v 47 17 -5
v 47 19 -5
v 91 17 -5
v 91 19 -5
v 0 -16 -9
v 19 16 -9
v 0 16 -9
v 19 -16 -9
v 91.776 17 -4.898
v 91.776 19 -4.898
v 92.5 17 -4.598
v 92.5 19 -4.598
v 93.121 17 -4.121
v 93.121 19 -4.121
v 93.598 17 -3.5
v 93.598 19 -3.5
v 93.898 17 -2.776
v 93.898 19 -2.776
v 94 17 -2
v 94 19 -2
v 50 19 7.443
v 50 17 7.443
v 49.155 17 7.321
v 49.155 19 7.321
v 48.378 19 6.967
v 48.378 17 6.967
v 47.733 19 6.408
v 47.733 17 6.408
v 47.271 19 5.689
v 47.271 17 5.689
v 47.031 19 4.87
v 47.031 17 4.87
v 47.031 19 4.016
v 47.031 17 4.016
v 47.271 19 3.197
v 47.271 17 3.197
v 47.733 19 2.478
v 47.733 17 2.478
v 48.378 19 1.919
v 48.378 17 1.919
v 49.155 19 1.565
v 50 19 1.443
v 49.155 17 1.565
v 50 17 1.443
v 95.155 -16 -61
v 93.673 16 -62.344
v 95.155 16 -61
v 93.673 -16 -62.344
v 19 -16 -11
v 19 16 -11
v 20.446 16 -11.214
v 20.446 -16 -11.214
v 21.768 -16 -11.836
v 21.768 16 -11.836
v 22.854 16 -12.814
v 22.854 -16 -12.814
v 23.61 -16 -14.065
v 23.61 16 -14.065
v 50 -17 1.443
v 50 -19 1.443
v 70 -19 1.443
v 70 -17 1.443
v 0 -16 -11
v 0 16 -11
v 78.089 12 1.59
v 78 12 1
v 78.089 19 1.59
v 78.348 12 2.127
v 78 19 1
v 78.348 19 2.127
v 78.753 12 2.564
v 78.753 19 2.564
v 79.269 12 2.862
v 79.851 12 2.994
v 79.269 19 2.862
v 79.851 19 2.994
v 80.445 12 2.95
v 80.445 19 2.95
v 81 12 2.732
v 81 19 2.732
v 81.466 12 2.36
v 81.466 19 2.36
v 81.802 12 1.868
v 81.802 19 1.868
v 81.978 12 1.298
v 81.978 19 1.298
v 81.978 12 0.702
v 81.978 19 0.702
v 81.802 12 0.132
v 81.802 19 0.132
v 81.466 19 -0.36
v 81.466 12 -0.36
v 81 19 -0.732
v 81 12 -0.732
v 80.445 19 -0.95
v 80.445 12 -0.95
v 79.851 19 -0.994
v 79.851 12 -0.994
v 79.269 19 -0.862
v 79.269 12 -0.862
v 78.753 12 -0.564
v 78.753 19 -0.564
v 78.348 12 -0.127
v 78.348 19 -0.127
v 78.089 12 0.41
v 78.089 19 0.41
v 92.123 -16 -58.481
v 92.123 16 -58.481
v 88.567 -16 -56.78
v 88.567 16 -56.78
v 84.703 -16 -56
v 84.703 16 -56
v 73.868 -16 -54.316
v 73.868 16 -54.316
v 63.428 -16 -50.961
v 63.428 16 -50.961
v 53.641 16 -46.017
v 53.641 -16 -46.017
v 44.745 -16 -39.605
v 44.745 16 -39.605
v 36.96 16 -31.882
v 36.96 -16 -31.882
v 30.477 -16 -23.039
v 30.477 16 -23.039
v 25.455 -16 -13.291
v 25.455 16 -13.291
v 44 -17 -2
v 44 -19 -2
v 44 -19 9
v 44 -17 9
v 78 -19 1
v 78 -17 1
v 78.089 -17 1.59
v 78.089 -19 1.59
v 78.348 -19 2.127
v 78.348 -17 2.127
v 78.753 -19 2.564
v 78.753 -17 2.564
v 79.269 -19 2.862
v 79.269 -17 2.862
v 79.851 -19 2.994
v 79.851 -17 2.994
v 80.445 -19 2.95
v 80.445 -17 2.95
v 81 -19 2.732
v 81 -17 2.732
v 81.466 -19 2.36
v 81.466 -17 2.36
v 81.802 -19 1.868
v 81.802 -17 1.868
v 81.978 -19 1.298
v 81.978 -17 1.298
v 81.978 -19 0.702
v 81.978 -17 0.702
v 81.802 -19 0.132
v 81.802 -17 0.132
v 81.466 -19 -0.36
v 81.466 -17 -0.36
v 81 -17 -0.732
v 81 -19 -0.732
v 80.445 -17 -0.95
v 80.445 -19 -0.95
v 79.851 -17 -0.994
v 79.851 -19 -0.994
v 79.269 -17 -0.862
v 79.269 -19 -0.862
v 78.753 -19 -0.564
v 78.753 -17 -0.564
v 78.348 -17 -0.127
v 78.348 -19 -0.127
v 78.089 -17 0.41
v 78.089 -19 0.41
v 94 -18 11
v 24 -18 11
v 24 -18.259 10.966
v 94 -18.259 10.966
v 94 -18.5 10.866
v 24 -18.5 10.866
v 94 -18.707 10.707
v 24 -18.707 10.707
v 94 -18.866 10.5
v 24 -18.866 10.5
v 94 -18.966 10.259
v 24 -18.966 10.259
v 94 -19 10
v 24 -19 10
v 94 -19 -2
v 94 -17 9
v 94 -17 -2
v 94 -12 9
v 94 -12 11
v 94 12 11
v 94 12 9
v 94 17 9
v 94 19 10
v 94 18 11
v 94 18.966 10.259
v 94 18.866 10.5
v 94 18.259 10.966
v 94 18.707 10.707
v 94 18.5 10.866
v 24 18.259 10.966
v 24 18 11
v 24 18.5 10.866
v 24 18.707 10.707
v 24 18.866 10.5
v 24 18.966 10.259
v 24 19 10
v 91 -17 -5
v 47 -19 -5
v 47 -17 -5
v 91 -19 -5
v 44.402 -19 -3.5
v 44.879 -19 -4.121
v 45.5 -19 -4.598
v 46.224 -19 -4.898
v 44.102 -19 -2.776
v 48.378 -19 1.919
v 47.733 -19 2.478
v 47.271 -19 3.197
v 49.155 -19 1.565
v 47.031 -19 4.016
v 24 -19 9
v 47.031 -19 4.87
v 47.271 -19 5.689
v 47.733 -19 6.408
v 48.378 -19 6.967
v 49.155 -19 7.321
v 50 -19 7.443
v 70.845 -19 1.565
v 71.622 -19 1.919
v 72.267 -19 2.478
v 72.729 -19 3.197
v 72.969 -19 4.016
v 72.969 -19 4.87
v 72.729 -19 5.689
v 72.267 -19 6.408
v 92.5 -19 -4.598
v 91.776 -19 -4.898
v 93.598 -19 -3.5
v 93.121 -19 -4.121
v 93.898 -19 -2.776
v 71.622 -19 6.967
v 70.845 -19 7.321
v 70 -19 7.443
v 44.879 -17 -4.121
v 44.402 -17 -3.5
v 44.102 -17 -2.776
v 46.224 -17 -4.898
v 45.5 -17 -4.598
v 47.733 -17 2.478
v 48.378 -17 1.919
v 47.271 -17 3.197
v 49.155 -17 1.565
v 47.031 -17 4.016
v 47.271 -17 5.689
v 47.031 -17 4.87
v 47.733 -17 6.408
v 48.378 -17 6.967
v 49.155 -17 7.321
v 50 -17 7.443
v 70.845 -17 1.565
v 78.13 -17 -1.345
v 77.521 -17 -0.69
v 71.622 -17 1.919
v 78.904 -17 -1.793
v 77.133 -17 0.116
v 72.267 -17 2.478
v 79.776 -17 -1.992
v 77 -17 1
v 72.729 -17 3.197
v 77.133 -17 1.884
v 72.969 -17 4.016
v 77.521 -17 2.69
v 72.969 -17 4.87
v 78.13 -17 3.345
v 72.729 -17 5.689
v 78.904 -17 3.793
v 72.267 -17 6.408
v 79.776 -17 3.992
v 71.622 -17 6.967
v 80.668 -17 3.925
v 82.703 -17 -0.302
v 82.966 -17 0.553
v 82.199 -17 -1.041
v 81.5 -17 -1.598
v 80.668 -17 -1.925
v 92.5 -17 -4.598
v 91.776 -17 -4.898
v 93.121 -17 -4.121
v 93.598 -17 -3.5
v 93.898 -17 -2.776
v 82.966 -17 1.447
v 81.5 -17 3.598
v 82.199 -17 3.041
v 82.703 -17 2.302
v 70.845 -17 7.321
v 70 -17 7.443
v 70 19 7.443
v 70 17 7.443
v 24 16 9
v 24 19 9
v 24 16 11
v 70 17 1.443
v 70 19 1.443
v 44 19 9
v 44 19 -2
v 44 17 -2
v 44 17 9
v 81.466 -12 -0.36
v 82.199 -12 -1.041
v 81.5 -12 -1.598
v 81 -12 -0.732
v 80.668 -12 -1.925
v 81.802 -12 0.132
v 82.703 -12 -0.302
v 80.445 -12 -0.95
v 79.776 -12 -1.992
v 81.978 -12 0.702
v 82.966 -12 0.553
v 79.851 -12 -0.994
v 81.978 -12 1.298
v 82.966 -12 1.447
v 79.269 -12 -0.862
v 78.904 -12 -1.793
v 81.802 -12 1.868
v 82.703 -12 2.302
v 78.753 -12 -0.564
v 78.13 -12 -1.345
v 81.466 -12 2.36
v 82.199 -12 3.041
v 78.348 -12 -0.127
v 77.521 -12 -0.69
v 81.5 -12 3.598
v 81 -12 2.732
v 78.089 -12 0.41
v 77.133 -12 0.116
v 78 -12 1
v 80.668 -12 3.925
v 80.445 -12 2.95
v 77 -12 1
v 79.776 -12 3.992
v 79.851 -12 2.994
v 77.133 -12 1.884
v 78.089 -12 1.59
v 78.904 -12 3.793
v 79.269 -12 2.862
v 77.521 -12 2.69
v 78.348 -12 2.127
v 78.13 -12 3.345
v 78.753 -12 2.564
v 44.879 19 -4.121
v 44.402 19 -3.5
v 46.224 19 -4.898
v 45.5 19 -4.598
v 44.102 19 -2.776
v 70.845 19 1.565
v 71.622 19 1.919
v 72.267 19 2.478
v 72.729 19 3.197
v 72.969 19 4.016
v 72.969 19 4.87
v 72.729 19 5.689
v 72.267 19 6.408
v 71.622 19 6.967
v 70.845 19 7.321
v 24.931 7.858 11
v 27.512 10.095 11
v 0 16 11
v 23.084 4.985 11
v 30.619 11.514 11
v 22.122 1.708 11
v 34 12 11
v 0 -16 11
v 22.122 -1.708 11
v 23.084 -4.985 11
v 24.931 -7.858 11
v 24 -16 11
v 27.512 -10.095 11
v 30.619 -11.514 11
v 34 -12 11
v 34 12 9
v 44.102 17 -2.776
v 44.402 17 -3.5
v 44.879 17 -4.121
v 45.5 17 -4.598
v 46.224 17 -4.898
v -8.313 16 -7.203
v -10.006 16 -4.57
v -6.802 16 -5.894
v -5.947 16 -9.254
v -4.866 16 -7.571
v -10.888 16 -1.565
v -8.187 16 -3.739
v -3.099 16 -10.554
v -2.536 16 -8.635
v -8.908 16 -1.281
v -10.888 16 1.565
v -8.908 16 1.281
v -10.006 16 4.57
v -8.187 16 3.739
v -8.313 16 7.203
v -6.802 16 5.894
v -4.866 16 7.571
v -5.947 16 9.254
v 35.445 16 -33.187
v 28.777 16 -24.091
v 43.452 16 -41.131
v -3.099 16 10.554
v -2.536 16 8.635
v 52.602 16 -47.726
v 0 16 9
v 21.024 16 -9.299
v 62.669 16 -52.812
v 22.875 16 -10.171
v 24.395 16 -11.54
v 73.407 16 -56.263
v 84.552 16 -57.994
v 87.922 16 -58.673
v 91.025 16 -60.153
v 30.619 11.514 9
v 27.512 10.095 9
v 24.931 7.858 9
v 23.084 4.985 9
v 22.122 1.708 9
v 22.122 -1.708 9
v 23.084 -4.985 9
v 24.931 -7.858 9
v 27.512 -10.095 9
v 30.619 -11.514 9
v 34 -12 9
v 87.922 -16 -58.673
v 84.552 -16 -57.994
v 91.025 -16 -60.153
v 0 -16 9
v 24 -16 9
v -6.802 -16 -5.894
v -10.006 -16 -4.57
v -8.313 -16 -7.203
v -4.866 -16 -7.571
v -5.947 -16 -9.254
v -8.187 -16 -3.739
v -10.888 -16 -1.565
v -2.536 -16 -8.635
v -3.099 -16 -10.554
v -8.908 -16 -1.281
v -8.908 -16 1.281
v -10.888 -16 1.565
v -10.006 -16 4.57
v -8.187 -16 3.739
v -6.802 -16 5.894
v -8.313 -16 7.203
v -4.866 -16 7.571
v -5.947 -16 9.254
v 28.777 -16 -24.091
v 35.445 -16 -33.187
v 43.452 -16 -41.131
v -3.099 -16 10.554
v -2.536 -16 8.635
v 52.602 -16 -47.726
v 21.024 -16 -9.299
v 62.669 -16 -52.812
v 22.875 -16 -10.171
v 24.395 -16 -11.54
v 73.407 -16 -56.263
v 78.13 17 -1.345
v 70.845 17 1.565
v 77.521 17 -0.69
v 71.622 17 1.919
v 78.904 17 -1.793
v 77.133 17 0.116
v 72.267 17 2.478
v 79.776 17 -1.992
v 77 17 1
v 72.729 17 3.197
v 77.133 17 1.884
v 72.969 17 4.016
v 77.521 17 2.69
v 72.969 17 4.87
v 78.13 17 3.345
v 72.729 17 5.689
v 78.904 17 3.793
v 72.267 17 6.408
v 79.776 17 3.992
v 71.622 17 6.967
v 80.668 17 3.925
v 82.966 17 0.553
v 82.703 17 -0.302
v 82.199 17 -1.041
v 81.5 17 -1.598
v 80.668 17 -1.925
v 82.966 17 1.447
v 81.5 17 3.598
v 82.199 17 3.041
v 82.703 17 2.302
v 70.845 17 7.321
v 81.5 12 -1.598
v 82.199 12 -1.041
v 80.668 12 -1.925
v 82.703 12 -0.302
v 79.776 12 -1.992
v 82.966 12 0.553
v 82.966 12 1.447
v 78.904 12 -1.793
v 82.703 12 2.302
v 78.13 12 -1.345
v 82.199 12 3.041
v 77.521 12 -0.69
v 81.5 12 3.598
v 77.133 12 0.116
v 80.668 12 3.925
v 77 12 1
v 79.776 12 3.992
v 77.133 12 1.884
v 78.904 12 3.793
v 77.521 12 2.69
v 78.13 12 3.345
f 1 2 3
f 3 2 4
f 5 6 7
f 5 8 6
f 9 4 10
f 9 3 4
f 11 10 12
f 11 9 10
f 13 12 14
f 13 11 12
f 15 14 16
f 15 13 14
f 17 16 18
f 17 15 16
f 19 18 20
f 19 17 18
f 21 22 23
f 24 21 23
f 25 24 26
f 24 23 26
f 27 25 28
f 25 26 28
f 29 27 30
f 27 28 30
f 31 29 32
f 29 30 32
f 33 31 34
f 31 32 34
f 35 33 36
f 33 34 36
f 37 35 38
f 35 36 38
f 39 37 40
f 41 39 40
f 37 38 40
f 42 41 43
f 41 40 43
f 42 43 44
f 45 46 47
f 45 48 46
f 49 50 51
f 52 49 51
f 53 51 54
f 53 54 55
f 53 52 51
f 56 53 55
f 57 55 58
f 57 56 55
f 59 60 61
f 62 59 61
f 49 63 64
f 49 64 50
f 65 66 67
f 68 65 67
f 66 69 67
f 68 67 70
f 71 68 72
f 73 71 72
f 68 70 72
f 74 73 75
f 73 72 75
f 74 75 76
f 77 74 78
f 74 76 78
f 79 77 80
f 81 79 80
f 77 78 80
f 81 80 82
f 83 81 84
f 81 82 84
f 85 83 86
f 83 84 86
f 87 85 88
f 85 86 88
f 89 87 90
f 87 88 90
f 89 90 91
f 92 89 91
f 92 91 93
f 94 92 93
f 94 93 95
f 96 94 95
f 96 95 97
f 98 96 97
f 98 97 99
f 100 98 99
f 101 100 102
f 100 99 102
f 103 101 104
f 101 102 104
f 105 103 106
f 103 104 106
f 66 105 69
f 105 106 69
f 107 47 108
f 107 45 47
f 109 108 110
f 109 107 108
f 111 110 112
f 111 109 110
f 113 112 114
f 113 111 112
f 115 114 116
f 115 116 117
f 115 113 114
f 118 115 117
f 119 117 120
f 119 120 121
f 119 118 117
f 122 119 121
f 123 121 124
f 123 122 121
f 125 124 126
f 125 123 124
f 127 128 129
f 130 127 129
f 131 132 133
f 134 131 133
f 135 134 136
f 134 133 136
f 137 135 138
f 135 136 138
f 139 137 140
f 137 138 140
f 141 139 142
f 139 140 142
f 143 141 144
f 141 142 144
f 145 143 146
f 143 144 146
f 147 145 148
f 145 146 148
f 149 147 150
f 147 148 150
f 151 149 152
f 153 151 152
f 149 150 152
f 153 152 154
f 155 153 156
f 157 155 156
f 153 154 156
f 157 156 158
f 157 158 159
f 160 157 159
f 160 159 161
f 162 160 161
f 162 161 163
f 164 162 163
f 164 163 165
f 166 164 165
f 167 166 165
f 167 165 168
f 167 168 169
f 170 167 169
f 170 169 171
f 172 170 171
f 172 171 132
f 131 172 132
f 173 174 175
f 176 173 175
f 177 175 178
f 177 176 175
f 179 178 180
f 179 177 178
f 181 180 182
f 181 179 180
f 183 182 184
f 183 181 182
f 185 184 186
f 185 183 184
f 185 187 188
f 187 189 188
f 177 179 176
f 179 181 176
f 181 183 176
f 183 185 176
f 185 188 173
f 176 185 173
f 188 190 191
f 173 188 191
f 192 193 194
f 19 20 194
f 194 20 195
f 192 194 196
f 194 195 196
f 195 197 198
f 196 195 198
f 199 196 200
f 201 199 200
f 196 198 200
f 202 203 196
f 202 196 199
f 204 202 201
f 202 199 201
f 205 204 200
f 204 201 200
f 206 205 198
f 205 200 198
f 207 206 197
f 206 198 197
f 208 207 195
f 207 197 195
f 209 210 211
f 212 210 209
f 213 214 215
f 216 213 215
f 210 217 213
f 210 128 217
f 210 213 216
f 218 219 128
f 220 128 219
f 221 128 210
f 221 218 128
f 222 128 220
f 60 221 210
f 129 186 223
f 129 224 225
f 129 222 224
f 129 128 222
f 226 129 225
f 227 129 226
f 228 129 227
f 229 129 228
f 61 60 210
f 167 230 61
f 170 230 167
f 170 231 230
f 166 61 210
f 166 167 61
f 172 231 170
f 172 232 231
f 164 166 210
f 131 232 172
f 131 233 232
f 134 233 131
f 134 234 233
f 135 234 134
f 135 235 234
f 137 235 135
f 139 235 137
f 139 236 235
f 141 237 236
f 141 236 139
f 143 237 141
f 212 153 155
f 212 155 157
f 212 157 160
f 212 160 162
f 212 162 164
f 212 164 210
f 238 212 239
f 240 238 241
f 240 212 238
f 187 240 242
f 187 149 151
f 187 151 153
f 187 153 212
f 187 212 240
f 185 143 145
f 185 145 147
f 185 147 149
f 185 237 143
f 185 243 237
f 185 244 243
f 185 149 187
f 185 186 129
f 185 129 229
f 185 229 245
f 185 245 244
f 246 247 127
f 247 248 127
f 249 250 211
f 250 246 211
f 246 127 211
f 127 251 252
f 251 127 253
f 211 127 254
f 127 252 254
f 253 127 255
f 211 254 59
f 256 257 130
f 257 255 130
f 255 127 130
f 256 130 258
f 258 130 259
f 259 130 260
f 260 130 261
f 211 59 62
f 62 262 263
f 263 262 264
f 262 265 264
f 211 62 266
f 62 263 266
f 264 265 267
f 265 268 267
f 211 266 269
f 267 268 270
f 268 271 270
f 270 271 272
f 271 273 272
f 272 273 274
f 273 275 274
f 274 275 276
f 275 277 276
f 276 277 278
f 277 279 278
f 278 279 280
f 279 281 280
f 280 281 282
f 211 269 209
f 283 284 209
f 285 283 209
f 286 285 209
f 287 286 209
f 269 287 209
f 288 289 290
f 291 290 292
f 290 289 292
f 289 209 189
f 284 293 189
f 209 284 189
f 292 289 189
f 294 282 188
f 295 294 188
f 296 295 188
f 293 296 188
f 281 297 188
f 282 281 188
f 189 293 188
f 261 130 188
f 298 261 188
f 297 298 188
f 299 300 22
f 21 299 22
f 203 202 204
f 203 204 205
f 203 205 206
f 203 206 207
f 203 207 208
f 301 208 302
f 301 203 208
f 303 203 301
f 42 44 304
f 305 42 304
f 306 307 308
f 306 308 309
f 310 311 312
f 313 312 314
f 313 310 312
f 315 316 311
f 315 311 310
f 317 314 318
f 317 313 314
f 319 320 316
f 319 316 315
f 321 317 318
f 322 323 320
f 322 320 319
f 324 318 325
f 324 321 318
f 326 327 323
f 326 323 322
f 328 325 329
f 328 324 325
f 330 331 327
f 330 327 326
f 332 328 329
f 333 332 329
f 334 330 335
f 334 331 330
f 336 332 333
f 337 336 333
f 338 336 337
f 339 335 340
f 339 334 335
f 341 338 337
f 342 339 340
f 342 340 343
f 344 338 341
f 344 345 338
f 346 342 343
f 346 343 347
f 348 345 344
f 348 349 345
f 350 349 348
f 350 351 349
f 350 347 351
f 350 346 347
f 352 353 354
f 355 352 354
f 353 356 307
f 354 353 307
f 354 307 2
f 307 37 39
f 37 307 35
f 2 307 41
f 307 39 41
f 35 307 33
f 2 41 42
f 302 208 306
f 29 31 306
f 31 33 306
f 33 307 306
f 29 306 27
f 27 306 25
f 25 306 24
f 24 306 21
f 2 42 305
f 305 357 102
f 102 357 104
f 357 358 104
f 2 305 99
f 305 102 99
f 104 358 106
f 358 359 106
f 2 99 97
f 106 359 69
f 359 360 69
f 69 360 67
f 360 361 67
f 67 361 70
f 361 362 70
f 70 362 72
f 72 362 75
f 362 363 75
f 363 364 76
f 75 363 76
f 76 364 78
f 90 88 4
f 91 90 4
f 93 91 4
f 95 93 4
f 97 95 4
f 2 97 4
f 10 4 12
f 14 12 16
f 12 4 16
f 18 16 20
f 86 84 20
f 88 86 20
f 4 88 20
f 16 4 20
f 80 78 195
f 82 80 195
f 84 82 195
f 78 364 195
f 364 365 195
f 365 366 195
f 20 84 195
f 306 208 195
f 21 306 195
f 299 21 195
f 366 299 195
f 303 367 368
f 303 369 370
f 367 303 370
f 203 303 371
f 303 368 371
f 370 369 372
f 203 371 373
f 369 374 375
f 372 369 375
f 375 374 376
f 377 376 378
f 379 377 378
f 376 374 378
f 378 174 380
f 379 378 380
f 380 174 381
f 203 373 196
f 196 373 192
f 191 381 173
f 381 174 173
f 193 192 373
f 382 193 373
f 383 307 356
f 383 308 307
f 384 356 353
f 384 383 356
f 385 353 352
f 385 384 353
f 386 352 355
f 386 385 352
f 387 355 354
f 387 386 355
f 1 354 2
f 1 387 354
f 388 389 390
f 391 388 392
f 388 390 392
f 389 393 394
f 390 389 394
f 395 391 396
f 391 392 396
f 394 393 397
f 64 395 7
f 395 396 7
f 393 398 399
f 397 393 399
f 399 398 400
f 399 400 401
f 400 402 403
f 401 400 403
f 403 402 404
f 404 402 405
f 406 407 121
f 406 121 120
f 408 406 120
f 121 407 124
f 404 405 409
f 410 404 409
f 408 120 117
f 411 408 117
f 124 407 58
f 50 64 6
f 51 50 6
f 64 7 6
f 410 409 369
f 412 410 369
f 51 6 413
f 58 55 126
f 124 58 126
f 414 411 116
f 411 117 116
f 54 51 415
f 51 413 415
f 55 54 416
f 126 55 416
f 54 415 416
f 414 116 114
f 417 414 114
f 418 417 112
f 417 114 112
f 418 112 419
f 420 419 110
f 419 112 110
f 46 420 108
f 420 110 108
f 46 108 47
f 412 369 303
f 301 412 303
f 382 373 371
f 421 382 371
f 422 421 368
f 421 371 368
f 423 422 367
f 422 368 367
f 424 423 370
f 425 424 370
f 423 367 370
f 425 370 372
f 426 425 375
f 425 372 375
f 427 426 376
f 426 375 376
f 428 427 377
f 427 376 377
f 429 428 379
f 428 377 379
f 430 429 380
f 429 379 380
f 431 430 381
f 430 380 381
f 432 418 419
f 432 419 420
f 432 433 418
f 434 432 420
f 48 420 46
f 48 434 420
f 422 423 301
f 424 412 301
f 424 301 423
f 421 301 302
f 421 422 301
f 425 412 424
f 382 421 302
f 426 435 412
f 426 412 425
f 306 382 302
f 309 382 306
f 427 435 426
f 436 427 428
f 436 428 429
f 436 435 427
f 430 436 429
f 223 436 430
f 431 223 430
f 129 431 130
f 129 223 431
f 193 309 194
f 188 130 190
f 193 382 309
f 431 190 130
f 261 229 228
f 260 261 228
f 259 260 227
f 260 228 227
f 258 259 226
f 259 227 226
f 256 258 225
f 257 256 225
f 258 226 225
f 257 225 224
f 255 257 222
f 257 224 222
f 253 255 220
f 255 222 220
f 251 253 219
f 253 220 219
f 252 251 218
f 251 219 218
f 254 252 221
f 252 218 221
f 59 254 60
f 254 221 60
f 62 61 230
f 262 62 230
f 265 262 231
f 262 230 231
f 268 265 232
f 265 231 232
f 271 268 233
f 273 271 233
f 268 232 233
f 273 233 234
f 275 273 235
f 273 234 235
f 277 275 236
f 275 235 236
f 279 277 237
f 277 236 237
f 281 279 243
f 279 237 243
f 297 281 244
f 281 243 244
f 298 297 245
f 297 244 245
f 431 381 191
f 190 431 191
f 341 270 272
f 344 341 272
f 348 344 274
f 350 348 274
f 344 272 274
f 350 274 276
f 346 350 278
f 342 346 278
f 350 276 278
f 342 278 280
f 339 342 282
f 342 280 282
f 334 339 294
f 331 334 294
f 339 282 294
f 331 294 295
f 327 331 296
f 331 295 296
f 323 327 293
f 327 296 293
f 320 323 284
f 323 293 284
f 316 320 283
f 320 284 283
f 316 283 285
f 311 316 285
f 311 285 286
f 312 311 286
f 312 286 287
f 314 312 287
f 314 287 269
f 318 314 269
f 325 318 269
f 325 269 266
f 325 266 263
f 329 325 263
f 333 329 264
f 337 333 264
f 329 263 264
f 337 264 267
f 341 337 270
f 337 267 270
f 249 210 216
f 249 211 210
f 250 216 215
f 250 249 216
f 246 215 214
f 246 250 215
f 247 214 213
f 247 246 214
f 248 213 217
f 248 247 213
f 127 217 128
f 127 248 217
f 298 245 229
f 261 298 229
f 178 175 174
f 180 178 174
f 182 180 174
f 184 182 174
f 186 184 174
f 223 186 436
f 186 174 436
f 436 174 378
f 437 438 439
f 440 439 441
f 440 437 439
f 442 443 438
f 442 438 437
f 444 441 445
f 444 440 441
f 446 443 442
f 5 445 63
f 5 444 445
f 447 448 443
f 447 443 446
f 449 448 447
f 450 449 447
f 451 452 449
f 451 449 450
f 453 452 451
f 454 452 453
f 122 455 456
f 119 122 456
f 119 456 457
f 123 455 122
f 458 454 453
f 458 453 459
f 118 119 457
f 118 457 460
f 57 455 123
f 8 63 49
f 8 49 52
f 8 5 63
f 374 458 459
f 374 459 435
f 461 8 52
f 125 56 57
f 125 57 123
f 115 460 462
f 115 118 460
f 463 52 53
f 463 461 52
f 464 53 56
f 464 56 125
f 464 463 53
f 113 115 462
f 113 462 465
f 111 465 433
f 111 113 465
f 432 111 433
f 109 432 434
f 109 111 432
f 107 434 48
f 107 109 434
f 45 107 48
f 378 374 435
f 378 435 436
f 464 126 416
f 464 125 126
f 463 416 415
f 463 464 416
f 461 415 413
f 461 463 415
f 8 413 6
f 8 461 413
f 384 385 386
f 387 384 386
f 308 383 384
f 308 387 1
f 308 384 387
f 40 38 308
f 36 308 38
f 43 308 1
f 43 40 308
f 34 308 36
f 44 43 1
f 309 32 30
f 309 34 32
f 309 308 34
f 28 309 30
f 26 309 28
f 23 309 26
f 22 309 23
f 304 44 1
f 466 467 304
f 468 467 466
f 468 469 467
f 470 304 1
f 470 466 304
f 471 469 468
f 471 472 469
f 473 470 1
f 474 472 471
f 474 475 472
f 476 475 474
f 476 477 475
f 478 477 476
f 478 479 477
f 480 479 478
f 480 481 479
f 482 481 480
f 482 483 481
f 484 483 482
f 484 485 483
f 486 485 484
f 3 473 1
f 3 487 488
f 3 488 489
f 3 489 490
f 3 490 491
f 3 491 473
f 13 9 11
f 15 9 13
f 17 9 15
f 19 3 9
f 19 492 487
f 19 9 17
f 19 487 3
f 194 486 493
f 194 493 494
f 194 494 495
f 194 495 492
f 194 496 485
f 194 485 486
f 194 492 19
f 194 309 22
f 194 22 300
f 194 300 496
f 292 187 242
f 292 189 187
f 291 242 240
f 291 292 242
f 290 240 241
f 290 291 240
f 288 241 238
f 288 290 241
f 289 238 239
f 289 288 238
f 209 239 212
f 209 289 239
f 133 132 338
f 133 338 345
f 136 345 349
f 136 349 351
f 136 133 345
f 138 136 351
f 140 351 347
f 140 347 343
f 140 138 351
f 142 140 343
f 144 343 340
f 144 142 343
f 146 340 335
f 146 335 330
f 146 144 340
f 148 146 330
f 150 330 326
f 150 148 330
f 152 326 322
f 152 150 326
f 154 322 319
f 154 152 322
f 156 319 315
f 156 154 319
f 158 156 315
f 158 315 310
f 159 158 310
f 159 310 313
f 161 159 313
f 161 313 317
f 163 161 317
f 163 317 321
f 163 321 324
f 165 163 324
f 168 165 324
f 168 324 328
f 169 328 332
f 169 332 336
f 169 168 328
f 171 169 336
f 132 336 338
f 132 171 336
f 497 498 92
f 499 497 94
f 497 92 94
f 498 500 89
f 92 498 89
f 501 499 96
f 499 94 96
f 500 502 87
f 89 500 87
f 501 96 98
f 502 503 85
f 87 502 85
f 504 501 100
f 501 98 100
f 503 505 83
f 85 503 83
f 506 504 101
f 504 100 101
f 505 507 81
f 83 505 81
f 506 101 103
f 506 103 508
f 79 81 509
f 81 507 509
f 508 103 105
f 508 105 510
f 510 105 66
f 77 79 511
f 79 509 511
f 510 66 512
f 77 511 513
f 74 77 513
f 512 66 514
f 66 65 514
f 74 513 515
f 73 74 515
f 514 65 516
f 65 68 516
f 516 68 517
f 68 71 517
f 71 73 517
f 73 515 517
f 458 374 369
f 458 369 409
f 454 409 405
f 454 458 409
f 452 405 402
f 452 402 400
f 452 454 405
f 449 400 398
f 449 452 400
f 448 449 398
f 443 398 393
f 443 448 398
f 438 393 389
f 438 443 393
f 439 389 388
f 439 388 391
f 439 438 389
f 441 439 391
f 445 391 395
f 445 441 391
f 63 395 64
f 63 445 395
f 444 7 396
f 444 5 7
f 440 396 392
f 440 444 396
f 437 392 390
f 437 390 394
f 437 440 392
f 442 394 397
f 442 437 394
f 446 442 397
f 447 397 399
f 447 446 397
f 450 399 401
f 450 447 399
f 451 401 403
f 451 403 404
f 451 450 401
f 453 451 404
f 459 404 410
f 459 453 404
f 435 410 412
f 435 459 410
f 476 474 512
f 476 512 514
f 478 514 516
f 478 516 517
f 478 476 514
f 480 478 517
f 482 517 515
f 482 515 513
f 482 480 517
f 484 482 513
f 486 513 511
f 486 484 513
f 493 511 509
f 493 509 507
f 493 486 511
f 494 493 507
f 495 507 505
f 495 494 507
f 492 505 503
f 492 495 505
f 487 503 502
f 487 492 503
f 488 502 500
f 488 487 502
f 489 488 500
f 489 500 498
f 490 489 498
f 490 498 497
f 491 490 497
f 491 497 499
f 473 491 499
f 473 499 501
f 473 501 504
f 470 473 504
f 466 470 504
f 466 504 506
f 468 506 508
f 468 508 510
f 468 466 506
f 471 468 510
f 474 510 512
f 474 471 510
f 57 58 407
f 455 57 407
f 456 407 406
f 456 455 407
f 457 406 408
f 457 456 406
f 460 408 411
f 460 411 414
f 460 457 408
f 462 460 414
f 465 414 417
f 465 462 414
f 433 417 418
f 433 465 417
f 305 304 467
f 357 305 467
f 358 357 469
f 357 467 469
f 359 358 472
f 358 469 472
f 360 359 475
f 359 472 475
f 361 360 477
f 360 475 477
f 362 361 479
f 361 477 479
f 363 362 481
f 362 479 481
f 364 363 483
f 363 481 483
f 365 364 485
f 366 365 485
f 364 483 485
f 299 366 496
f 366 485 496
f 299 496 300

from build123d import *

# Parameters (mm, degrees)
F1_DEPTH  = 16
F2_W      = 70
F2_H      = 3
F3_DEPTH  = 2
F4_W      = 50
F4_H      = 14
F5_DEPTH  = 2
F6_R      = 1
F9_DEPTH  = 2
F11_DEPTH = 38.001
F13_D     = 4
F14_R     = 3
F14_R_2   = 2
F15_DEPTH = 5
F16_R     = 3


# Not quite as in the source:
# - a pattern or mirror of a feature is missing from the dataset's text; its kind, count and spacing are read off the source's solid


with BuildPart() as f1:
    # F0 (on Front) → F1 (new body)
    with BuildSketch(Plane.XZ):
        with BuildLine():
            Line((94, 11), (0, 11))
            ThreePointArc((0, 11), (-11, 0), (0, -11))
            Line((0, -11), (19, -11))
            ThreePointArc((19, -11), (21.7681124643, -11.8361612201), (23.6103896104, -14.064978646))
            ThreePointArc((23.6103896104, -14.064978646), (47.8977113224, -44.6078392712), (84.5520957277, -57.9942665386))
            ThreePointArc((84.5520957277, -57.9942665386), (89.5187953856, -59.3173941728), (93.6732506492, -62.3438233708))
            Line((93.6732506492, -62.3438233708), (95.1549842887, -61))
            ThreePointArc((95.1549842887, -61), (90.3976747979, -57.5207528796), (84.7034264019, -56))
            ThreePointArc((84.7034264019, -56), (49.0672193413, -42.9854179344), (25.4545454545, -13.2909701044))
            ThreePointArc((25.4545454545, -13.2909701044), (22.87535745, -10.1706257081), (19, -9))
            Line((19, -9), (0, -9))
            ThreePointArc((0, -9), (-9, 0), (0, 9))
            Line((0, 9), (94, 9))
            Line((94, 9), (94, 11))
        make_face()
    extrude(amount=F1_DEPTH)

    # F2 (on face) → F3 (join)
    with BuildSketch(Plane.XY.offset(11)):
        with Locations((59, -17.5)):
            Rectangle(F2_W, F2_H)
    extrude(amount=-F3_DEPTH)

    # F4 (on face) → F5 (join)
    with BuildSketch(Plane.XZ.offset(19)):
        with Locations((69, 2)):
            Rectangle(F4_W, F4_H)
    extrude(amount=-F5_DEPTH)

    # F6
    f6_edges = [f1.edges().sort_by_distance(p)[0] for p in [
        (59, -19, 11),
    ]]
    fillet(f6_edges, radius=F6_R)

    # F7: F1 across plane


with BuildPart() as f1_1:
    add(f1.part)
    add(f1.part.mirror(Plane.XZ))

    # F8 (on face) → F9 (cut)
    with BuildSketch(Plane.XY.offset(11)):
        with BuildLine():
            Line((94, 12), (34, 12))
            ThreePointArc((34, 12), (22, 0), (34, -12))
            Line((34, -12), (94, -12))
            Line((94, -12), (94, 12))
        make_face()
    extrude(amount=-F9_DEPTH, mode=Mode.SUBTRACT)

    # F10 (on face) → F11 (cut, through all)
    with BuildSketch(Plane.XZ.offset(19)):
        with BuildLine():
            ThreePointArc((50, 7.4429814443), (47, 4.4429814443), (50, 1.4429814443))
            Line((50, 1.4429814443), (70, 1.4429814443))
            ThreePointArc((70, 1.4429814443), (73, 4.4429814443), (70, 7.4429814443))
            Line((70, 7.4429814443), (50, 7.4429814443))
        make_face()
    extrude(amount=-F11_DEPTH, mode=Mode.SUBTRACT)

    # F13 (through all)
    with Locations(Plane.XZ.offset(19)):
        with Locations((80, 1)):
            Hole(F13_D / 2)

    # F14 (on face) → F15 (join)
    with BuildSketch(Plane(origin=(0, -17, 0), x_dir=(-1, 0, 0), z_dir=(0, 1, 0))):
        with Locations((-80, 1)):
            Circle(F14_R)
        with Locations((-80, 1)):
            Circle(F14_R_2, mode=Mode.SUBTRACT)
    f15 = extrude(amount=F15_DEPTH)

    # F15_copies: F15 across plane
    add(f15.mirror(Plane.ZX))

    # F16
    f16_edges = [f1_1.edges().sort_by_distance(p)[0] for p in [
        (94, 18, -5),
        (44, 18, -5),
        (94, -18, -5),
        (44, -18, -5),
    ]]
    fillet(f16_edges, radius=F16_R)


solid = f1_1.part
